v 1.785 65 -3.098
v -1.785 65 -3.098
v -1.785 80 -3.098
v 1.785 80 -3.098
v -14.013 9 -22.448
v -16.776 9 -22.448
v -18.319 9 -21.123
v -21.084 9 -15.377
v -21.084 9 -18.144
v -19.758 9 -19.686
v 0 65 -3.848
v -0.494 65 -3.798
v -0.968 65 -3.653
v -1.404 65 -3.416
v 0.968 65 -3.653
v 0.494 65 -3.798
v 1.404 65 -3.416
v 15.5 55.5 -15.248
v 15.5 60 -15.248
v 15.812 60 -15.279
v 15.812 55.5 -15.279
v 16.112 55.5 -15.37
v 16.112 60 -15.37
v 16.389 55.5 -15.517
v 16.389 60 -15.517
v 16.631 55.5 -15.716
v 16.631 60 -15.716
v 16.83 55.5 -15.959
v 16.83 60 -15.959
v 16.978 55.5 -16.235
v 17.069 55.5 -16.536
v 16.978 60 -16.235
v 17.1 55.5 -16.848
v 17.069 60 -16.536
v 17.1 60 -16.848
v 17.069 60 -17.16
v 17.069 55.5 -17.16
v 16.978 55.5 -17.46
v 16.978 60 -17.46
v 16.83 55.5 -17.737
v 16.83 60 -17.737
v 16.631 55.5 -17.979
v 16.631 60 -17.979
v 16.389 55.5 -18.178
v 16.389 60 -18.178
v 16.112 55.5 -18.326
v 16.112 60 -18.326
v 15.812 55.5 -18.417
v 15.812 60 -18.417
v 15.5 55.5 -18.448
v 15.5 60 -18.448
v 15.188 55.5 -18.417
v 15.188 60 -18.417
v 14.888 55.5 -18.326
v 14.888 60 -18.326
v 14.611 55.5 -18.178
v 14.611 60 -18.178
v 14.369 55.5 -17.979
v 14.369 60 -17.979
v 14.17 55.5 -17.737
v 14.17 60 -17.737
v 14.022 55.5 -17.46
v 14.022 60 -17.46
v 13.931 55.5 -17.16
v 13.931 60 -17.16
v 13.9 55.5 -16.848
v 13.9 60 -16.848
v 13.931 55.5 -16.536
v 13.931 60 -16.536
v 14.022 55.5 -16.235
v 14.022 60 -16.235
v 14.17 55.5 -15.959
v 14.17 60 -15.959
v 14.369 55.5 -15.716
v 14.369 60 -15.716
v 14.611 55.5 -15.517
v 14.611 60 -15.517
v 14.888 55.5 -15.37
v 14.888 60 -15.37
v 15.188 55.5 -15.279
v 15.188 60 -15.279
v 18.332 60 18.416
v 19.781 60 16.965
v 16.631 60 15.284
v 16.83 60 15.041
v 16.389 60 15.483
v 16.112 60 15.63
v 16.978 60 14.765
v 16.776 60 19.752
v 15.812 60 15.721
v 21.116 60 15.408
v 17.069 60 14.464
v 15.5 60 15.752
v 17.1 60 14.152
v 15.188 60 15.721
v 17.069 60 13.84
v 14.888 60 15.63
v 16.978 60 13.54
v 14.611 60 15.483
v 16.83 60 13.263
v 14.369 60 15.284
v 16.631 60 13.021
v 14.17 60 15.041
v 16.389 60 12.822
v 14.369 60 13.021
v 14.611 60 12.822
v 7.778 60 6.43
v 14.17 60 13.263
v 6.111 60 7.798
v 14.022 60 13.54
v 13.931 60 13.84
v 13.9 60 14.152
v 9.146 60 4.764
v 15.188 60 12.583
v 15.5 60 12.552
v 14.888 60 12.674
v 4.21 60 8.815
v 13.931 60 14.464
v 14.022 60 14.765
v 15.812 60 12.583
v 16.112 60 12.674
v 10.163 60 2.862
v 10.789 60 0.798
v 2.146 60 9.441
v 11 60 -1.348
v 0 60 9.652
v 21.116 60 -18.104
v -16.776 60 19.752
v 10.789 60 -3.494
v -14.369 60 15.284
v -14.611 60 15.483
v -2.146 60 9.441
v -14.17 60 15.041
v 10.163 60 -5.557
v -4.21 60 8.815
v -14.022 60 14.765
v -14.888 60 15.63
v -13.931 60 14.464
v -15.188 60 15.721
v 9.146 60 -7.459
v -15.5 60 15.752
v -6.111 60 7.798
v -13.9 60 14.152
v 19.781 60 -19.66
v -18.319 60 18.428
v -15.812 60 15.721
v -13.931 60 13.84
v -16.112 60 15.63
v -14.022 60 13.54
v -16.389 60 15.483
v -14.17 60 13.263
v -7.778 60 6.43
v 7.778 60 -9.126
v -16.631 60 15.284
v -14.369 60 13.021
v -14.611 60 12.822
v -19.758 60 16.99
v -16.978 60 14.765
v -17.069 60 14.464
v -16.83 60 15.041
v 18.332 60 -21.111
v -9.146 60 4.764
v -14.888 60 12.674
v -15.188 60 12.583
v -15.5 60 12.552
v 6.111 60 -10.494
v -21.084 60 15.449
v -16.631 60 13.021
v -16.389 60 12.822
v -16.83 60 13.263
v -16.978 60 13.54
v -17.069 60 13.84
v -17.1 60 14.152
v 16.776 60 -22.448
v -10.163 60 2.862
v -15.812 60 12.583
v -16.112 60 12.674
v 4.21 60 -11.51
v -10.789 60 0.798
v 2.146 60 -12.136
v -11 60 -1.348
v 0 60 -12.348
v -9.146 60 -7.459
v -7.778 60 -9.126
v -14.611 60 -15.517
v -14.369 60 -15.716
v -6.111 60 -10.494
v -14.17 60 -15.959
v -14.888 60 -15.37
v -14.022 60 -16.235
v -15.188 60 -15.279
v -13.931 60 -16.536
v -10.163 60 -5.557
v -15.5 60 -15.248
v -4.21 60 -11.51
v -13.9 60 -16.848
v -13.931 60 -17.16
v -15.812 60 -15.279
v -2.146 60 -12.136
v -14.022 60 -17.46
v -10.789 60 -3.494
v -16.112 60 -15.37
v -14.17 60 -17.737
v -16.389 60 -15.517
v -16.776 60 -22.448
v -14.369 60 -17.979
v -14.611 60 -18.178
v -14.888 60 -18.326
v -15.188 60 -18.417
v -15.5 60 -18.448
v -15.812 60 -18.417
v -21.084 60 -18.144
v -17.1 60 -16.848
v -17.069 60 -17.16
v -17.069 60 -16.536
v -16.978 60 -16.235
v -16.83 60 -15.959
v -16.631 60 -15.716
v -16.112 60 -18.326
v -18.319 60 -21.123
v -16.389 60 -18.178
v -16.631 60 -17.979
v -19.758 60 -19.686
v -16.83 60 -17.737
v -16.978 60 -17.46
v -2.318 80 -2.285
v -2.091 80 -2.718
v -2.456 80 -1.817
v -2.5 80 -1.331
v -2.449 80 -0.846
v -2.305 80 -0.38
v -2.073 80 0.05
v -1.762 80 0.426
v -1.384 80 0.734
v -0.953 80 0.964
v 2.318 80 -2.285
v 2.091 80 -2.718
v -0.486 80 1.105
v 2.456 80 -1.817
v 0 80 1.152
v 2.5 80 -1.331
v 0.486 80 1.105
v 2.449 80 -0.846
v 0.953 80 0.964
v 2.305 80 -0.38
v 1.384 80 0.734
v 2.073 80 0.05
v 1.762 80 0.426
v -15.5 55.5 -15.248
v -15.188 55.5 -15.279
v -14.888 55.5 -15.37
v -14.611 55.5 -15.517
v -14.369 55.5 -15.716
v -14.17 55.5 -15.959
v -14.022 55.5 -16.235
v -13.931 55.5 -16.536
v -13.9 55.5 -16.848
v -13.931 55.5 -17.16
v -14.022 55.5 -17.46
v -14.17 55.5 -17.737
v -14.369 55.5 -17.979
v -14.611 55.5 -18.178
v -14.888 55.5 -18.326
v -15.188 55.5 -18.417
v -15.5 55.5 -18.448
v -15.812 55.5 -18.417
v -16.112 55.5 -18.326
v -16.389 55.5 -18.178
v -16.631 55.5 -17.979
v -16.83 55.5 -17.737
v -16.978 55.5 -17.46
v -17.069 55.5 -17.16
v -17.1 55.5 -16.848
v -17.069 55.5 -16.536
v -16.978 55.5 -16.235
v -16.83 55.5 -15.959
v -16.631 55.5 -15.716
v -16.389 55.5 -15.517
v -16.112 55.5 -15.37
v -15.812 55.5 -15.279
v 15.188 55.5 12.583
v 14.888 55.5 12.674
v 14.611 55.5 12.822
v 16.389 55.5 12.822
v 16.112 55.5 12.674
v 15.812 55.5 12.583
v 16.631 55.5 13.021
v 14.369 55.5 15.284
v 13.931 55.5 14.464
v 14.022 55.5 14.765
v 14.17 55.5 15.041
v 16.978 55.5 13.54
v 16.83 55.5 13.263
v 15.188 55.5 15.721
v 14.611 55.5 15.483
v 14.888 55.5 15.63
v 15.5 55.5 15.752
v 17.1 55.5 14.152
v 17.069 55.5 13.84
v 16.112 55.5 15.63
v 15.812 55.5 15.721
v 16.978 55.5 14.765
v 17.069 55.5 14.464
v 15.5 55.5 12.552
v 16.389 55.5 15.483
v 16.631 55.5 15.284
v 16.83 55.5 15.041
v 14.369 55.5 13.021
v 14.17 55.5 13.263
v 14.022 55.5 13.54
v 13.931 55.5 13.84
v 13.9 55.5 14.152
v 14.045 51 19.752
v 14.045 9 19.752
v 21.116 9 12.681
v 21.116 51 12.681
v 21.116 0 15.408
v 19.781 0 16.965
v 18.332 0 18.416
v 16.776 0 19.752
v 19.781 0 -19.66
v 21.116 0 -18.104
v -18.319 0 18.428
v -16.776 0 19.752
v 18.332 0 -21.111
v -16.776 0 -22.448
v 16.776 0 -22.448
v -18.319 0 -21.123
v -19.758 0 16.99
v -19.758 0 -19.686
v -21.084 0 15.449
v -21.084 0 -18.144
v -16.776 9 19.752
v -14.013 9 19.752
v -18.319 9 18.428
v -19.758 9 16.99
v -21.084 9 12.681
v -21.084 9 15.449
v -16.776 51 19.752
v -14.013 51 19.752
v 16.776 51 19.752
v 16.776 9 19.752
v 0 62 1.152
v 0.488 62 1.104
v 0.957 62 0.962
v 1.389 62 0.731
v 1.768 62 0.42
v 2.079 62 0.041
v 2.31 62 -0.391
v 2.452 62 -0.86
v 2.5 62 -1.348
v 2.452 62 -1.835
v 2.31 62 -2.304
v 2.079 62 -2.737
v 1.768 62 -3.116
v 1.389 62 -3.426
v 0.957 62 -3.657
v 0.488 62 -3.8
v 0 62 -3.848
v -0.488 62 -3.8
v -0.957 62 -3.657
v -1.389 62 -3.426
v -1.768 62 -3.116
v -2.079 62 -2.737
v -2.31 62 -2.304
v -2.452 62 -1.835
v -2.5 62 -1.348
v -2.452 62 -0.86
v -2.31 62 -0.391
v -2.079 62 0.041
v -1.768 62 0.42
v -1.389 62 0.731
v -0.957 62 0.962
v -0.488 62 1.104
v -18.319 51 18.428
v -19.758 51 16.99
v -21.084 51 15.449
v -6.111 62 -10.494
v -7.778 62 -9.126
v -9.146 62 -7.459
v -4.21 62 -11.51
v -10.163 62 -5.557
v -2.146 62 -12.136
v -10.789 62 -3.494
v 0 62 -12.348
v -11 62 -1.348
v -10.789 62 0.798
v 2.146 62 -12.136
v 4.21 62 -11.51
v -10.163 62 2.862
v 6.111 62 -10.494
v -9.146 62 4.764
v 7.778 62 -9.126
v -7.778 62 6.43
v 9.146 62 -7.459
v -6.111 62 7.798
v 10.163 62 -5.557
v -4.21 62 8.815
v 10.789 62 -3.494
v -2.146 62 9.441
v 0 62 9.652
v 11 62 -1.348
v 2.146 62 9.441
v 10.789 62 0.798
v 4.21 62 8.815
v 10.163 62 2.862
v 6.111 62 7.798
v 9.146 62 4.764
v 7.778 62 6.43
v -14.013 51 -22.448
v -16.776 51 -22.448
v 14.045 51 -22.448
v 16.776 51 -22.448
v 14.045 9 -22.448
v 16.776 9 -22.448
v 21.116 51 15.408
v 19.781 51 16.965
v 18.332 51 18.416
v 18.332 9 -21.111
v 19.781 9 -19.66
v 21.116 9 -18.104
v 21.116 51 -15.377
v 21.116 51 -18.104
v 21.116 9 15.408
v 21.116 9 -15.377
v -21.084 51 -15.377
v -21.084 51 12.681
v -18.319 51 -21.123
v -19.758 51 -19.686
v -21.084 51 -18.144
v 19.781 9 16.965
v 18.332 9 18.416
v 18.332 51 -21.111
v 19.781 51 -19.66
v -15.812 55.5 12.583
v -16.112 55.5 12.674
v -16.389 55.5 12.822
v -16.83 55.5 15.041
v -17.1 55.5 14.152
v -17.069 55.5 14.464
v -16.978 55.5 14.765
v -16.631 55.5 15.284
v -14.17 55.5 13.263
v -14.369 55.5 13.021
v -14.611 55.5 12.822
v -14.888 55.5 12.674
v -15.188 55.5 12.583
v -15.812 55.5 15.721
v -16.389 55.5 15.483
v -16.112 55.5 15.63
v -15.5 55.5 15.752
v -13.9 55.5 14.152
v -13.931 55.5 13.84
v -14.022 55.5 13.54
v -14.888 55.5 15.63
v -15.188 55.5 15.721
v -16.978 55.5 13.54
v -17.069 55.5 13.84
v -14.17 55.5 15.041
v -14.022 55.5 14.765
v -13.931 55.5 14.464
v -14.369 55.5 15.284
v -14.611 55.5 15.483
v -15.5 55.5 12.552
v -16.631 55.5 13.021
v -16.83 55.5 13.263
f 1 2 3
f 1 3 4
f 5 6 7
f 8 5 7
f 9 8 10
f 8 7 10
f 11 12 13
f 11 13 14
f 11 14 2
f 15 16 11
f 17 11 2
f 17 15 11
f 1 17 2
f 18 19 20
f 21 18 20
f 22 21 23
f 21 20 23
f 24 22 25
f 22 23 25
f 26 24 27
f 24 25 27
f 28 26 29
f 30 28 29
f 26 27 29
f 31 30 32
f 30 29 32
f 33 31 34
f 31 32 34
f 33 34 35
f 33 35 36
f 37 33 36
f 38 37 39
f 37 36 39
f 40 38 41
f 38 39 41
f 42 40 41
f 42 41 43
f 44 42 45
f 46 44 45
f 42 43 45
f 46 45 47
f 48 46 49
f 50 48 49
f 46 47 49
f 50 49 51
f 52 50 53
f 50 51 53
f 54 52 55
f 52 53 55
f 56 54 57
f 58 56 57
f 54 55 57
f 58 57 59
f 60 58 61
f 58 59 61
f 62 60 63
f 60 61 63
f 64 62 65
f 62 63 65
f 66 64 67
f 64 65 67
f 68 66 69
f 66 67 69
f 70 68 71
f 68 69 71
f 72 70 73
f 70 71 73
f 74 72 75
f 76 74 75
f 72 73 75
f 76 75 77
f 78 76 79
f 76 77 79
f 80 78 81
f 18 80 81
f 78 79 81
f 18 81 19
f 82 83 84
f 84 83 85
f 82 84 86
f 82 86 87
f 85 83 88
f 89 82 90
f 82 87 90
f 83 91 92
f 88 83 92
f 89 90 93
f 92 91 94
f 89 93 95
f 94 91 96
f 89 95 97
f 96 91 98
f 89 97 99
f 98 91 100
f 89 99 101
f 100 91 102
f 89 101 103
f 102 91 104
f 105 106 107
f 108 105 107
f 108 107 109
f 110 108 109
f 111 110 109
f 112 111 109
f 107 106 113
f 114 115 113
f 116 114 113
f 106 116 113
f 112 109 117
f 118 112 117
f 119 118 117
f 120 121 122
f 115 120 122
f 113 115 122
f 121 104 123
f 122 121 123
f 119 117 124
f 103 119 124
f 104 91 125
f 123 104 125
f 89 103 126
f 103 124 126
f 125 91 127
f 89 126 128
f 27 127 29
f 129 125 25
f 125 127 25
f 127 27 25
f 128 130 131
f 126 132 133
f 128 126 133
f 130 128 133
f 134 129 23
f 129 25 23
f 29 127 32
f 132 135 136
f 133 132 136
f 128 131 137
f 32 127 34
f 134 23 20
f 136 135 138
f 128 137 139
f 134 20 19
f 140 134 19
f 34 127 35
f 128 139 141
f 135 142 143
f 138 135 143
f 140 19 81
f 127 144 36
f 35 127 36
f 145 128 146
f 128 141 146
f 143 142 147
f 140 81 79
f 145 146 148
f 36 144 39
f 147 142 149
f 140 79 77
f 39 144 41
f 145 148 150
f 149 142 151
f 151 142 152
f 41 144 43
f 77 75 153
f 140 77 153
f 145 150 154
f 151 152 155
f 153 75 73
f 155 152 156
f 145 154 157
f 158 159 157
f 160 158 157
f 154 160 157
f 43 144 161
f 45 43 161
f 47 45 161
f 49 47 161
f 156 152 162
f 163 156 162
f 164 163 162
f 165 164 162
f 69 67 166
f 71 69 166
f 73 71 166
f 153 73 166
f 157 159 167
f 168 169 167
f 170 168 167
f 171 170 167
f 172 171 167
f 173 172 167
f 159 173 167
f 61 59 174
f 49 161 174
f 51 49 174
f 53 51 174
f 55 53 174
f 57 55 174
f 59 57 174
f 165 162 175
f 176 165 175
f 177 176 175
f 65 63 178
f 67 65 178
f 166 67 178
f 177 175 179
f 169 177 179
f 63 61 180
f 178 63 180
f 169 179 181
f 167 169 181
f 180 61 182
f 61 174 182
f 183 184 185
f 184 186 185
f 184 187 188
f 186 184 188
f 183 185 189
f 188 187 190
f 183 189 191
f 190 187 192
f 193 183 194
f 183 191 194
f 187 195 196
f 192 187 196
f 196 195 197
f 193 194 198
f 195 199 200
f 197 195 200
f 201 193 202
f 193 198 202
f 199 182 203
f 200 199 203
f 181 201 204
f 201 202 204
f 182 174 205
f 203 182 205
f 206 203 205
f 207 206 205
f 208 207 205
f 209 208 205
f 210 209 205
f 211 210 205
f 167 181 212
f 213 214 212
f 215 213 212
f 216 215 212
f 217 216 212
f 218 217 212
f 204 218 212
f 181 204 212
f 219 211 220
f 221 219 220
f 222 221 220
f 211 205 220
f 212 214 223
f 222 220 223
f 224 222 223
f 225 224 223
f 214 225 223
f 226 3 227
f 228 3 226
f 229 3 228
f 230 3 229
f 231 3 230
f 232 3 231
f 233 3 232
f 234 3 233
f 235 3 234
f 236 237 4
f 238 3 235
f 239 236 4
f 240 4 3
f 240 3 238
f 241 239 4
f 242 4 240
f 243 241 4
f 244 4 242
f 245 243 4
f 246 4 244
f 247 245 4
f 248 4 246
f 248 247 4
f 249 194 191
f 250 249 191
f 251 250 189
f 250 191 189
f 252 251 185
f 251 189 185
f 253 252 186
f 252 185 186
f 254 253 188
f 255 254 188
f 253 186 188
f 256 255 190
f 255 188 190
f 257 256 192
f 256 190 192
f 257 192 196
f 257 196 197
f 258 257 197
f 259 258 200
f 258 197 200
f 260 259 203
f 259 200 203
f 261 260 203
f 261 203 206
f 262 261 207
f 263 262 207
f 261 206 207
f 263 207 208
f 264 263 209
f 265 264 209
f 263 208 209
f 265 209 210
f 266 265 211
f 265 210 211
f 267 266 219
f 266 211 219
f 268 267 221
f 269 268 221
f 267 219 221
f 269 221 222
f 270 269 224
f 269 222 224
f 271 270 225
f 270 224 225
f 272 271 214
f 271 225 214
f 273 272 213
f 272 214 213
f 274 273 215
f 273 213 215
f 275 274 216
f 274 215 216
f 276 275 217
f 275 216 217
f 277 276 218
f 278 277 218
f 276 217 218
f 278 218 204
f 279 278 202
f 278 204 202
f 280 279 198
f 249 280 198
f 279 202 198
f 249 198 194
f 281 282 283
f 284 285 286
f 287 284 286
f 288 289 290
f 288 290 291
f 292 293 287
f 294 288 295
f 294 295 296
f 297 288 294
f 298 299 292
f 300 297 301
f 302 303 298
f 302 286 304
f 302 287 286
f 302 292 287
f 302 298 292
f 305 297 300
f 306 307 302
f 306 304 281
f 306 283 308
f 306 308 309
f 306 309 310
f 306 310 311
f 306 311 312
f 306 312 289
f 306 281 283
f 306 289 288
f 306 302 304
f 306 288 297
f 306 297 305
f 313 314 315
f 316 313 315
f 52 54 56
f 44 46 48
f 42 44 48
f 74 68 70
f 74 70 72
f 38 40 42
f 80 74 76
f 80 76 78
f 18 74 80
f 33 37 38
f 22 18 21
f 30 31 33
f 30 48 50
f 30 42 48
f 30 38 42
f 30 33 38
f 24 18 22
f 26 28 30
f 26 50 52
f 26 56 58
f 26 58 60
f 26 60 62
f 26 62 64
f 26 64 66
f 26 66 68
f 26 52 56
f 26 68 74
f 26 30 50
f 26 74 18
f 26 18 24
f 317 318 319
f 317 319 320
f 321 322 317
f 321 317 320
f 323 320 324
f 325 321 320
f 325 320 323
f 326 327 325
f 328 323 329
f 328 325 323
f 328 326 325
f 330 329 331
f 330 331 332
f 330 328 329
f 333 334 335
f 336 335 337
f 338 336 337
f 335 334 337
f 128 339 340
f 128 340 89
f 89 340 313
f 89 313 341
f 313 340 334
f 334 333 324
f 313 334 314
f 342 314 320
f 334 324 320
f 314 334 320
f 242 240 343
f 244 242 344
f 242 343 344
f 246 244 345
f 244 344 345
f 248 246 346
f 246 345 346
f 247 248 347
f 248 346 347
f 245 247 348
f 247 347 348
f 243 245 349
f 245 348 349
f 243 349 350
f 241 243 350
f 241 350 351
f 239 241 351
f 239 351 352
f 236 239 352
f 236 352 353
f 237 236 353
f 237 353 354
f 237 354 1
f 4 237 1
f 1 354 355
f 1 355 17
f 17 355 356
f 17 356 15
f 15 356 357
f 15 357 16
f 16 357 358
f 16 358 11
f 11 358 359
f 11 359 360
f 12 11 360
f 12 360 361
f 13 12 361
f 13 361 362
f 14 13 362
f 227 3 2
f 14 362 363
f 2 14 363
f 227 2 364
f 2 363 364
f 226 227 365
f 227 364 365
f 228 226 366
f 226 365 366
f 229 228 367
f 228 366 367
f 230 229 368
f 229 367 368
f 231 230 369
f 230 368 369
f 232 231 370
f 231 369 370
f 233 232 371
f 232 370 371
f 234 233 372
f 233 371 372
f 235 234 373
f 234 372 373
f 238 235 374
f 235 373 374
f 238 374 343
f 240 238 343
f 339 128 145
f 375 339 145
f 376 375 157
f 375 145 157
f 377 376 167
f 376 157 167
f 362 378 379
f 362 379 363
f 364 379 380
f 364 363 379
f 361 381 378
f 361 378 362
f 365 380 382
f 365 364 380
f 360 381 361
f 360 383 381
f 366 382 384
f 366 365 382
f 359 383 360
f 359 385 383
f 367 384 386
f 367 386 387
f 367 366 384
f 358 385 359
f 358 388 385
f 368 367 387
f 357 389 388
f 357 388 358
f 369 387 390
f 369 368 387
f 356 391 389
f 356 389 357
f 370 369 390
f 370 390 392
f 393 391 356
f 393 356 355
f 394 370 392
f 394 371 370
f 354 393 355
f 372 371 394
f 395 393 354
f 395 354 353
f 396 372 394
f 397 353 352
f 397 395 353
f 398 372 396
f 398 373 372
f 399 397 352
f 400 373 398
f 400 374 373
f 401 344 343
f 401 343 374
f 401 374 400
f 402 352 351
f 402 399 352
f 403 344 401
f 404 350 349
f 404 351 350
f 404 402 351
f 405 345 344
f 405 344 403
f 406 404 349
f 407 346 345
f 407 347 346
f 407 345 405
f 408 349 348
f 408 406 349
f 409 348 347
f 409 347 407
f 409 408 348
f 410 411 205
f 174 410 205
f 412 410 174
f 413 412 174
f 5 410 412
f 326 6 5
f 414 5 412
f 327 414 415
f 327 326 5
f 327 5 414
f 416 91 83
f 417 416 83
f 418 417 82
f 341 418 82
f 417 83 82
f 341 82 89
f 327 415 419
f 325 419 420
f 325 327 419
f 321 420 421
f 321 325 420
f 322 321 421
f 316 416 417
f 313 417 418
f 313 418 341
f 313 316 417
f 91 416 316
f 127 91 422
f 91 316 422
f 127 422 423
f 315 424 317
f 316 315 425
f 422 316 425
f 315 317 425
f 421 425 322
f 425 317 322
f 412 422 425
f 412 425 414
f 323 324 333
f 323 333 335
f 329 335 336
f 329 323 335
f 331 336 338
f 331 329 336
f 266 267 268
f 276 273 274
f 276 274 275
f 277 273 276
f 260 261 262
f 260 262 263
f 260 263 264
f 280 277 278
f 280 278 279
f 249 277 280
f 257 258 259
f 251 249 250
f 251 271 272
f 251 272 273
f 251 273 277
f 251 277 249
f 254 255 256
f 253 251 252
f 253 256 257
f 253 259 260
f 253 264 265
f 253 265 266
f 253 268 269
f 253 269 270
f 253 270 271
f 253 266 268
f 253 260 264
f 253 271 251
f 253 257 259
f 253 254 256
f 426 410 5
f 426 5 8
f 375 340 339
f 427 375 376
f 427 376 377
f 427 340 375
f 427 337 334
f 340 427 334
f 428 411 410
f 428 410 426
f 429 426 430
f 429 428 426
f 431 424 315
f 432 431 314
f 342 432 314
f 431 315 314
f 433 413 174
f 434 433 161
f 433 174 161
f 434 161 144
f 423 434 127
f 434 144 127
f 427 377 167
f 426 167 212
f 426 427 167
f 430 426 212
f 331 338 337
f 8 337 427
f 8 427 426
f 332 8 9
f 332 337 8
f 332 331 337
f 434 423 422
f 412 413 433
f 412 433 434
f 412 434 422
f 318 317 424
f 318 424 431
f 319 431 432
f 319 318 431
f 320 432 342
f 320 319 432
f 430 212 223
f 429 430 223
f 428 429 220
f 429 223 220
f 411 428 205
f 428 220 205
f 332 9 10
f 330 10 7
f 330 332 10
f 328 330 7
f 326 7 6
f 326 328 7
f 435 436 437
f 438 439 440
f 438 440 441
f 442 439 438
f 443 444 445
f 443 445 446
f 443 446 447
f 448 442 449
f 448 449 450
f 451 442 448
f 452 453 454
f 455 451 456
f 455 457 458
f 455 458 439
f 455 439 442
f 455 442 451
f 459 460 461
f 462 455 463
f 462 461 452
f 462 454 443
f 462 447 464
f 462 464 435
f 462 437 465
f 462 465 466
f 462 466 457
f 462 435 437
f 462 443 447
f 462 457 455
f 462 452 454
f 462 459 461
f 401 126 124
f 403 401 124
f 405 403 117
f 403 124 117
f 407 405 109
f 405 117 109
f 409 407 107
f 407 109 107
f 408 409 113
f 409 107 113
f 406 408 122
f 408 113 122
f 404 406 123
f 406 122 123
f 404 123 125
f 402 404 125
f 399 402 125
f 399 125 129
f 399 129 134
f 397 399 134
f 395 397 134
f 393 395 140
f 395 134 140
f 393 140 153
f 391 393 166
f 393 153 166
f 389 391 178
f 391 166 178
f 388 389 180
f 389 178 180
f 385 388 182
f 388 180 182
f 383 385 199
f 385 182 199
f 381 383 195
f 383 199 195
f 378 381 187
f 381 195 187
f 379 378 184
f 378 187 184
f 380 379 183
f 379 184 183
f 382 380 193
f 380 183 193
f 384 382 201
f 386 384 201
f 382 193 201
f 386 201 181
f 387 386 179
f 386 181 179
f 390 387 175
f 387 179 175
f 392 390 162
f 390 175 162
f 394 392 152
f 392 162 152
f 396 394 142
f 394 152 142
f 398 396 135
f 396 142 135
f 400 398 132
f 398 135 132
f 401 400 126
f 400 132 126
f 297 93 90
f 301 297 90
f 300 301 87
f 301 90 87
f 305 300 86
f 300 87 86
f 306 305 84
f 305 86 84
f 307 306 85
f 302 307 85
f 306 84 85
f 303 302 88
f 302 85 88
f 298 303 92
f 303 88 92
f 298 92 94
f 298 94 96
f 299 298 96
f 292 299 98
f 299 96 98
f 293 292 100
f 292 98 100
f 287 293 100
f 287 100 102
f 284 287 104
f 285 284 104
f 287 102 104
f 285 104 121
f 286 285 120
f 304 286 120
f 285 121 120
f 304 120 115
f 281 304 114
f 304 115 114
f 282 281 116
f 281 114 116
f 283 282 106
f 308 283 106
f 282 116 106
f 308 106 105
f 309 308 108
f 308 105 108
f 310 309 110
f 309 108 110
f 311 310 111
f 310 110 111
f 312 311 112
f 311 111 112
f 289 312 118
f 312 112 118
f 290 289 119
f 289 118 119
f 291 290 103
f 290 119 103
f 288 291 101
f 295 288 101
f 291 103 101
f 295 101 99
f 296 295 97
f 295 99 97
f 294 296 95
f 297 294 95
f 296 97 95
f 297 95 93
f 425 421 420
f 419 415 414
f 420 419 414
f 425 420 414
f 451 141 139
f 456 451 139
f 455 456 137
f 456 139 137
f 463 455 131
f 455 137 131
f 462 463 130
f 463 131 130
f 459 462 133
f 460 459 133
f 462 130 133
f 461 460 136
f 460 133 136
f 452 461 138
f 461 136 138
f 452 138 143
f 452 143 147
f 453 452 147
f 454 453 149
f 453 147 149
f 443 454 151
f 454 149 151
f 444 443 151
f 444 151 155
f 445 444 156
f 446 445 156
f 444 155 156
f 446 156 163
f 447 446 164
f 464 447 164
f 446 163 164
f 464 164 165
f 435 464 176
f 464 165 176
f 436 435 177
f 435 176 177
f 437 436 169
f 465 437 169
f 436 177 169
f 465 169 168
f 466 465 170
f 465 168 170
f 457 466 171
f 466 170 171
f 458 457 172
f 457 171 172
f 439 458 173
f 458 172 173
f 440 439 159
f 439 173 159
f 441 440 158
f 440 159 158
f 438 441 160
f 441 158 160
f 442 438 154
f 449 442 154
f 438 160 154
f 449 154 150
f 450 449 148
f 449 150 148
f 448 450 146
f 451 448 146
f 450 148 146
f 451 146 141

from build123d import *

# Parameters (mm, degrees)
EXTRUDE_1_DEPTH     = 60
EXTRUDE_2_DEPTH     = 9
SKETCH_7_R          = 11
EXTRUDE_3_DEPTH     = 2
SKETCH_8_R          = 2.5
EXTRUDE_4_DEPTH     = 18
CUT_EXTRUDE_START   = -15
CUT_EXTRUDE_1_DEPTH = 15
SKETCH_10_R         = 1.6
CUT_EXTRUDE_2_DEPTH = 4.5


with BuildPart() as part:
    # 草图2 → 凸台-拉伸1 (new body)
    with BuildSketch(Plane(origin=(0, 0, 0), x_dir=(1, 0, 0), z_dir=(0, 1, 0))):
        Polygon((-14.012734328, 22.447763171), (-21.08380214, 15.376695359), (-21.08380214, -12.681169017), (-14.012734328, -19.752236829), (14.045130048, -19.752236829), (21.11619786, -12.681169017), (21.11619786, 15.376695359), (14.045130048, 22.447763171), align=None)
    extrude(amount=EXTRUDE_1_DEPTH)

    # 草图5 → 凸台-拉伸2 (add)
    with BuildSketch(Plane(origin=(0, 60, 0), x_dir=(1, 0, 0), z_dir=(0, 1, 0))):
        with BuildLine():
            Line((-16.776242784, 22.447763171), (16.776242784, 22.447763171))
            ThreePointArc((16.776242784, 22.447763171), (19.070321818, 20.399669839), (21.11619786, 18.103613191))
            Line((21.11619786, 18.103613191), (21.11619786, -15.408086849))
            ThreePointArc((21.11619786, -15.408086849), (19.070321818, -17.704143498), (16.776242784, -19.752236829))
            Line((16.776242784, -19.752236829), (-16.776242784, -19.752236829))
            ThreePointArc((-16.776242784, -19.752236829), (-19.051917848, -17.722547478), (-21.08380214, -15.448831998))
            Line((-21.08380214, -15.448831998), (-21.08380214, 18.14435834))
            ThreePointArc((-21.08380214, 18.14435834), (-19.051917848, 20.41807382), (-16.776242784, 22.447763171))
        make_face()
    extrude_2 = extrude(amount=-EXTRUDE_2_DEPTH)

    # 镜向1: 凸台-拉伸2 across plane
    add(extrude_2.mirror(Plane.ZX.offset(30)))

    # 草图7 → 凸台-拉伸3 (add)
    with BuildSketch(Plane(origin=(0, 60, 0), x_dir=(1, 0, 0), z_dir=(0, 1, 0))):
        with Locations(Location((0, 1.347763171, 0), (0, 0, 270))):
            Circle(SKETCH_7_R)
    extrude(amount=EXTRUDE_3_DEPTH)

    # 草图8 → 凸台-拉伸4 (add)
    with BuildSketch(Plane(origin=(0, 62, 0), x_dir=(1, 0, 0), z_dir=(0, 1, 0))):
        with Locations(Location((0, 1.347763171, 0), (0, 0, 270))):
            Circle(SKETCH_8_R)
    extrude(amount=EXTRUDE_4_DEPTH)

    # 草图9 → 切除-拉伸1 (cut)
    with BuildSketch(Plane(origin=(0, 80, 0), x_dir=(1, 0, 0), z_dir=(0, 1, 0)).offset(CUT_EXTRUDE_START)):
        with BuildLine():
            Line((-1.785357107, 3.097763171), (1.785357107, 3.097763171))
            ThreePointArc((1.785357107, 3.097763171), (0, 3.847763171), (-1.785357107, 3.097763171))
        make_face()
    extrude(amount=CUT_EXTRUDE_1_DEPTH, mode=Mode.SUBTRACT)

    # 草图10 → 切除-拉伸2 (cut)
    with BuildSketch(Plane(origin=(0, 60, 0), x_dir=(1, 0, 0), z_dir=(0, 1, 0))):
        with Locations(Location((-15.5, 16.847763171, 0), (0, 0, 270))):
            Circle(SKETCH_10_R)
        with Locations(Location((15.5, 16.847763171, 0), (0, 0, 270))):
            Circle(SKETCH_10_R)
        with Locations(Location((15.5, -14.152236829, 0), (0, 0, 270))):
            Circle(SKETCH_10_R)
        with Locations(Location((-15.5, -14.152236829, 0), (0, 0, 270))):
            Circle(SKETCH_10_R)
    extrude(amount=-CUT_EXTRUDE_2_DEPTH, mode=Mode.SUBTRACT)


solid = part.part
